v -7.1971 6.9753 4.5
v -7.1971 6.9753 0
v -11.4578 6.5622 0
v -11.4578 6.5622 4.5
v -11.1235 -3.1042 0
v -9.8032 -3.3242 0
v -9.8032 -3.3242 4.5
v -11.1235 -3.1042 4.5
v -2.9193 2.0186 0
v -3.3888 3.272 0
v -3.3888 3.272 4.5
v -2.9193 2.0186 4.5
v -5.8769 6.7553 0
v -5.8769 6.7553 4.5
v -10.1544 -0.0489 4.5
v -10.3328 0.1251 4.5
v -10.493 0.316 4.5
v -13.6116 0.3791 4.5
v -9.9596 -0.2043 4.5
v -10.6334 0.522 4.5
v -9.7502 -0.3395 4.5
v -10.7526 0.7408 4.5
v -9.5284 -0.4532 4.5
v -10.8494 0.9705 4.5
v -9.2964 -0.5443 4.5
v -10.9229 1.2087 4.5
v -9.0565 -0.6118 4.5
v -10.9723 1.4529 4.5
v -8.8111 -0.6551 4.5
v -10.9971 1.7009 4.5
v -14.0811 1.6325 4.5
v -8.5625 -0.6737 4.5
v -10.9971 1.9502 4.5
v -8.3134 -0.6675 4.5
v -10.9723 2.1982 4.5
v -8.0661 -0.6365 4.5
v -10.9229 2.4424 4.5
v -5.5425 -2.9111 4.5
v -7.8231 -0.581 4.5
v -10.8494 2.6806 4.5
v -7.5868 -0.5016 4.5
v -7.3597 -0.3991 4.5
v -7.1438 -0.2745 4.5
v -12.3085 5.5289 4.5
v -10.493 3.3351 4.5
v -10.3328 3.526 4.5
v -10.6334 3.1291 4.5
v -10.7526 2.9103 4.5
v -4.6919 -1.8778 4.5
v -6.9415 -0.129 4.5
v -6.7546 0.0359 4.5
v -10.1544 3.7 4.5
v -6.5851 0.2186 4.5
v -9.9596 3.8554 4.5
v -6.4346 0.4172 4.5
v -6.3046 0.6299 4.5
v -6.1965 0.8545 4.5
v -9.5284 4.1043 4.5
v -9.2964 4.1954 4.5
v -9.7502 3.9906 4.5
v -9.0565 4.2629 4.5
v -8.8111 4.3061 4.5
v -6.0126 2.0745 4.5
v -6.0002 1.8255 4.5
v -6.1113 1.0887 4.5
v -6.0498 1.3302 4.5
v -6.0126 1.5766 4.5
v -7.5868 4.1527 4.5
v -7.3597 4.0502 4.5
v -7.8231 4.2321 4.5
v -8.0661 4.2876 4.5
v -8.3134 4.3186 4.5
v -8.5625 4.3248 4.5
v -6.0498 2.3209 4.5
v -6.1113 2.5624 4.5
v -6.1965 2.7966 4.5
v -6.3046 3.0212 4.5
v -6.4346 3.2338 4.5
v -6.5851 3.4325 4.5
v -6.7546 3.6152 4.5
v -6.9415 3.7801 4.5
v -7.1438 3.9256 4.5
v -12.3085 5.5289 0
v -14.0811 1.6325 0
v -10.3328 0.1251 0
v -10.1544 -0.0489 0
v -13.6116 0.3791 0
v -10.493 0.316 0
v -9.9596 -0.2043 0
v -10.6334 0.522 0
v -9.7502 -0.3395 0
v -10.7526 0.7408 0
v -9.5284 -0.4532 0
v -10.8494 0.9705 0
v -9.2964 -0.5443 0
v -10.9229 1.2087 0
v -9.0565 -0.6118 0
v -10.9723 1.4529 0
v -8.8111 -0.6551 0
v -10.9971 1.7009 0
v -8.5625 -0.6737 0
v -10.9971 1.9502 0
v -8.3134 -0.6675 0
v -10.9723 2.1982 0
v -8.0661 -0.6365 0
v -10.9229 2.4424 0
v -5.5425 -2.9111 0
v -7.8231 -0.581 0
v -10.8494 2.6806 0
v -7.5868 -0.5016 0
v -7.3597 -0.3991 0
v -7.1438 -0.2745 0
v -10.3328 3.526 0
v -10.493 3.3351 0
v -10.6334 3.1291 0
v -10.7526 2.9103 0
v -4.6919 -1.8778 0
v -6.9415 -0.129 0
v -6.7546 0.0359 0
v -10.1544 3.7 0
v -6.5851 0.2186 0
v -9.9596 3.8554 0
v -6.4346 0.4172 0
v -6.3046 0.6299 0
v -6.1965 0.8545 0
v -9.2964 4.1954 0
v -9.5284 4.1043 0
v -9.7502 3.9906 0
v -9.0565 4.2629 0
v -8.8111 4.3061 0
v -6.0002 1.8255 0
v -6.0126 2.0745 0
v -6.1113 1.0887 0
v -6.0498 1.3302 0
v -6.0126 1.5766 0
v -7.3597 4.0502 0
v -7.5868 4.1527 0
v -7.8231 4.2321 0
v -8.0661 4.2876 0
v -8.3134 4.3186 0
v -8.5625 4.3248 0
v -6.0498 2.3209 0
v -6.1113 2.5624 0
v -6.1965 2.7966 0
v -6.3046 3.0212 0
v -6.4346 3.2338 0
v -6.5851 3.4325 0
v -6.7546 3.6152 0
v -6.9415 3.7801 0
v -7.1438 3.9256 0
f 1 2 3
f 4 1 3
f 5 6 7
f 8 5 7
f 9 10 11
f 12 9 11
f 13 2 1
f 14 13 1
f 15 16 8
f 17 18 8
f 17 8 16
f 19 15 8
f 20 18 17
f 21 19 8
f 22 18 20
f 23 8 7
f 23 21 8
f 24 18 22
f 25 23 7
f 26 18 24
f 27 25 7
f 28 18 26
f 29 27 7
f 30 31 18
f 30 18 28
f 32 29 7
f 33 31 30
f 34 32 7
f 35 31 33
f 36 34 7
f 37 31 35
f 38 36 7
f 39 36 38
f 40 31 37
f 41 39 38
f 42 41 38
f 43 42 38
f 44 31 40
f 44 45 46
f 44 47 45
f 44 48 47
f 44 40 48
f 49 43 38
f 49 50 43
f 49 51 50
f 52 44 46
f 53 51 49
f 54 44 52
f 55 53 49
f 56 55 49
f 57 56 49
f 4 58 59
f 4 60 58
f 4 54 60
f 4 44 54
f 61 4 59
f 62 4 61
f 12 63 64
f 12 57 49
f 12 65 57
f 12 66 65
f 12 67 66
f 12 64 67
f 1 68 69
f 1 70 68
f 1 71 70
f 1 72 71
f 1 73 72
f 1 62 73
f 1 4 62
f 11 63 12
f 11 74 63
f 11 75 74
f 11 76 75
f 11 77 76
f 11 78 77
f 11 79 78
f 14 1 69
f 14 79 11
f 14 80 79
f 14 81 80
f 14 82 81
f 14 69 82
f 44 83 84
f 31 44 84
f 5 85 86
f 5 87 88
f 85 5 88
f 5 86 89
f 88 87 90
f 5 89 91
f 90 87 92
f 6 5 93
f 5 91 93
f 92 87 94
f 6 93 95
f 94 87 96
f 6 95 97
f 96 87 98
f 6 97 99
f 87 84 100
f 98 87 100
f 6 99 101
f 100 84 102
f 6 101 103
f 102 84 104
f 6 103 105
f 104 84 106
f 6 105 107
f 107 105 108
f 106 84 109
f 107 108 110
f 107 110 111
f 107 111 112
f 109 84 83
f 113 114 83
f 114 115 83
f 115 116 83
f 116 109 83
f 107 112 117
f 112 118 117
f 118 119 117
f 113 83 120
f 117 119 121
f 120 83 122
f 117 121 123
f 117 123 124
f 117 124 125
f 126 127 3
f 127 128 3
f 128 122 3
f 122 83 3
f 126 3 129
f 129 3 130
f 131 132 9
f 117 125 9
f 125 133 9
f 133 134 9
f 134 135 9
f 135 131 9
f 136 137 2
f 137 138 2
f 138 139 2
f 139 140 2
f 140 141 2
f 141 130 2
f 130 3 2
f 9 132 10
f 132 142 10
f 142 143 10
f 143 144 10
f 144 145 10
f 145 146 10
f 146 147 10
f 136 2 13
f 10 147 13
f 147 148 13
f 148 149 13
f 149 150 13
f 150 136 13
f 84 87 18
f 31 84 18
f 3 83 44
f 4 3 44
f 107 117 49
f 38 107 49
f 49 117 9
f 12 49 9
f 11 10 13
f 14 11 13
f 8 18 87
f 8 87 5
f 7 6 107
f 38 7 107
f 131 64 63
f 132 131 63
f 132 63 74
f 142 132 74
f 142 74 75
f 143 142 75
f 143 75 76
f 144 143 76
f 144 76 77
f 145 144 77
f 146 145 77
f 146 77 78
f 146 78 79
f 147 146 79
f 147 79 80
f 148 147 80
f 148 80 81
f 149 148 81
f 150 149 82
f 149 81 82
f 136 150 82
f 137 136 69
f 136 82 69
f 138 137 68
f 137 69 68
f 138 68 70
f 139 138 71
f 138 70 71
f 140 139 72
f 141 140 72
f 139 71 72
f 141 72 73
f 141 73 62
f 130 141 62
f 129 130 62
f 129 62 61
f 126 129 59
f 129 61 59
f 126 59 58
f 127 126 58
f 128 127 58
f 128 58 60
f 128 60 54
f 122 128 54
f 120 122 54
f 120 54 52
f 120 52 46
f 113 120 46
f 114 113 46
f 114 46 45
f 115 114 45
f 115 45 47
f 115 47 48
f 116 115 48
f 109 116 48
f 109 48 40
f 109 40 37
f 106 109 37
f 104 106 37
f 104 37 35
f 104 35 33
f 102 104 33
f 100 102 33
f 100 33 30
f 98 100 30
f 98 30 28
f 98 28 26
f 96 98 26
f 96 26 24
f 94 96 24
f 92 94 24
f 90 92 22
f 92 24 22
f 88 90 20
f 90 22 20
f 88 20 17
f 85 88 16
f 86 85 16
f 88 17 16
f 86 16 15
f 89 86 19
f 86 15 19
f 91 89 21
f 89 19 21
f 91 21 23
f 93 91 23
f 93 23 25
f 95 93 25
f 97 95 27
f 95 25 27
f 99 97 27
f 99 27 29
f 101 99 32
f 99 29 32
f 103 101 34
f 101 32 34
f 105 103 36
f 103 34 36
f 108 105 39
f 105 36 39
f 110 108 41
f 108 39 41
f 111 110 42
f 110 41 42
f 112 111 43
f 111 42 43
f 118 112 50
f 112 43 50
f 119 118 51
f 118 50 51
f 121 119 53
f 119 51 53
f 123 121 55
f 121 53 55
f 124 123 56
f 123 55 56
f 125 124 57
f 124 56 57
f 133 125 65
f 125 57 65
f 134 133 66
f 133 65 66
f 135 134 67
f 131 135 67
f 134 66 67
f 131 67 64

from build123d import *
from OCP.BRepFilletAPI import BRepFilletAPI_MakeChamfer

# Parameters (mm, degrees)
RESSALTO_EXTRUS_O1_DEPTH = 4.5
ESBO_O2_R                = 2.5
CORTE_EXTRUS_O1_DEPTH    = 7.5
CHANFRO1_SIZE            = 0.4
CHANFRO1_SIZE2           = 1.092820323


with BuildPart() as part:
    # Esboço1 → Ressalto-extrusão1 (new body)
    with BuildSketch(Plane.XY):
        Polygon((-5.144411163, -2.872547916), (-2.753633945, 2.382689246), (-6.109414221, 7.080781632), (-11.855971715, 6.523636857), (-14.246748933, 1.268399695), (-10.890968657, -3.429692692), align=None)
    extrude(amount=RESSALTO_EXTRUS_O1_DEPTH)

    # Esboço2 → Corte-extrusão1 (cut)
    with BuildSketch(Plane.XY.offset(4.5)):
        with Locations((-8.500191439, 1.82554447)):
            Circle(ESBO_O2_R)
    extrude(amount=-CORTE_EXTRUS_O1_DEPTH, mode=Mode.SUBTRACT)

    # Chanfro1: one chamfer whose edges measure the first distance from different faces: ONE call of the kernel's chamfer builder (chamfer() names one face for all edges)
    chanfro1_edges_1 = [part.edges().sort_by_distance(p)[0] for p in [
        (-10.890968657, -3.429692692, 2.25),
    ]]
    chanfro1_side_1 = [part.faces().sort_by_distance(p)[0] for p in [
        (-12.568858795, -1.080646498, 2.25),
    ]]
    chanfro1_edges_2 = [part.edges().sort_by_distance(p)[0] for p in [
        (-14.246748933, 1.268399695, 2.25),
    ]]
    chanfro1_side_2 = [part.faces().sort_by_distance(p)[0] for p in [
        (-13.051360324, 3.896018276, 2.25),
    ]]
    chanfro1_edges_3 = [part.edges().sort_by_distance(p)[0] for p in [
        (-11.855971715, 6.523636857, 2.25),
    ]]
    chanfro1_side_3 = [part.faces().sort_by_distance(p)[0] for p in [
        (-8.982692968, 6.802209244, 2.25),
    ]]
    chanfro1_edges_4 = [part.edges().sort_by_distance(p)[0] for p in [
        (-6.109414221, 7.080781632, 2.25),
    ]]
    chanfro1_side_4 = [part.faces().sort_by_distance(p)[0] for p in [
        (-4.431524083, 4.731735439, 2.25),
    ]]
    chanfro1_edges_5 = [part.edges().sort_by_distance(p)[0] for p in [
        (-2.753633945, 2.382689246, 2.25),
    ]]
    chanfro1_side_5 = [part.faces().sort_by_distance(p)[0] for p in [
        (-3.949022554, -0.244929335, 2.25),
    ]]
    chanfro1_edges_6 = [part.edges().sort_by_distance(p)[0] for p in [
        (-5.144411163, -2.872547916, 2.25),
    ]]
    chanfro1_side_6 = [part.faces().sort_by_distance(p)[0] for p in [
        (-8.01768991, -3.151120304, 2.25),
    ]]
    chanfro1 = BRepFilletAPI_MakeChamfer(part.part.solid().wrapped)
    for e in chanfro1_edges_1:
        chanfro1.Add(CHANFRO1_SIZE, CHANFRO1_SIZE2, e.wrapped, chanfro1_side_1[0].wrapped)  # the first distance lies on this face
    for e in chanfro1_edges_2:
        chanfro1.Add(CHANFRO1_SIZE, CHANFRO1_SIZE2, e.wrapped, chanfro1_side_2[0].wrapped)  # the first distance lies on this face
    for e in chanfro1_edges_3:
        chanfro1.Add(CHANFRO1_SIZE, CHANFRO1_SIZE2, e.wrapped, chanfro1_side_3[0].wrapped)  # the first distance lies on this face
    for e in chanfro1_edges_4:
        chanfro1.Add(CHANFRO1_SIZE, CHANFRO1_SIZE2, e.wrapped, chanfro1_side_4[0].wrapped)  # the first distance lies on this face
    for e in chanfro1_edges_5:
        chanfro1.Add(CHANFRO1_SIZE, CHANFRO1_SIZE2, e.wrapped, chanfro1_side_5[0].wrapped)  # the first distance lies on this face
    for e in chanfro1_edges_6:
        chanfro1.Add(CHANFRO1_SIZE, CHANFRO1_SIZE2, e.wrapped, chanfro1_side_6[0].wrapped)  # the first distance lies on this face
    add(Compound.cast(chanfro1.Shape()), mode=Mode.REPLACE)


solid = part.part
